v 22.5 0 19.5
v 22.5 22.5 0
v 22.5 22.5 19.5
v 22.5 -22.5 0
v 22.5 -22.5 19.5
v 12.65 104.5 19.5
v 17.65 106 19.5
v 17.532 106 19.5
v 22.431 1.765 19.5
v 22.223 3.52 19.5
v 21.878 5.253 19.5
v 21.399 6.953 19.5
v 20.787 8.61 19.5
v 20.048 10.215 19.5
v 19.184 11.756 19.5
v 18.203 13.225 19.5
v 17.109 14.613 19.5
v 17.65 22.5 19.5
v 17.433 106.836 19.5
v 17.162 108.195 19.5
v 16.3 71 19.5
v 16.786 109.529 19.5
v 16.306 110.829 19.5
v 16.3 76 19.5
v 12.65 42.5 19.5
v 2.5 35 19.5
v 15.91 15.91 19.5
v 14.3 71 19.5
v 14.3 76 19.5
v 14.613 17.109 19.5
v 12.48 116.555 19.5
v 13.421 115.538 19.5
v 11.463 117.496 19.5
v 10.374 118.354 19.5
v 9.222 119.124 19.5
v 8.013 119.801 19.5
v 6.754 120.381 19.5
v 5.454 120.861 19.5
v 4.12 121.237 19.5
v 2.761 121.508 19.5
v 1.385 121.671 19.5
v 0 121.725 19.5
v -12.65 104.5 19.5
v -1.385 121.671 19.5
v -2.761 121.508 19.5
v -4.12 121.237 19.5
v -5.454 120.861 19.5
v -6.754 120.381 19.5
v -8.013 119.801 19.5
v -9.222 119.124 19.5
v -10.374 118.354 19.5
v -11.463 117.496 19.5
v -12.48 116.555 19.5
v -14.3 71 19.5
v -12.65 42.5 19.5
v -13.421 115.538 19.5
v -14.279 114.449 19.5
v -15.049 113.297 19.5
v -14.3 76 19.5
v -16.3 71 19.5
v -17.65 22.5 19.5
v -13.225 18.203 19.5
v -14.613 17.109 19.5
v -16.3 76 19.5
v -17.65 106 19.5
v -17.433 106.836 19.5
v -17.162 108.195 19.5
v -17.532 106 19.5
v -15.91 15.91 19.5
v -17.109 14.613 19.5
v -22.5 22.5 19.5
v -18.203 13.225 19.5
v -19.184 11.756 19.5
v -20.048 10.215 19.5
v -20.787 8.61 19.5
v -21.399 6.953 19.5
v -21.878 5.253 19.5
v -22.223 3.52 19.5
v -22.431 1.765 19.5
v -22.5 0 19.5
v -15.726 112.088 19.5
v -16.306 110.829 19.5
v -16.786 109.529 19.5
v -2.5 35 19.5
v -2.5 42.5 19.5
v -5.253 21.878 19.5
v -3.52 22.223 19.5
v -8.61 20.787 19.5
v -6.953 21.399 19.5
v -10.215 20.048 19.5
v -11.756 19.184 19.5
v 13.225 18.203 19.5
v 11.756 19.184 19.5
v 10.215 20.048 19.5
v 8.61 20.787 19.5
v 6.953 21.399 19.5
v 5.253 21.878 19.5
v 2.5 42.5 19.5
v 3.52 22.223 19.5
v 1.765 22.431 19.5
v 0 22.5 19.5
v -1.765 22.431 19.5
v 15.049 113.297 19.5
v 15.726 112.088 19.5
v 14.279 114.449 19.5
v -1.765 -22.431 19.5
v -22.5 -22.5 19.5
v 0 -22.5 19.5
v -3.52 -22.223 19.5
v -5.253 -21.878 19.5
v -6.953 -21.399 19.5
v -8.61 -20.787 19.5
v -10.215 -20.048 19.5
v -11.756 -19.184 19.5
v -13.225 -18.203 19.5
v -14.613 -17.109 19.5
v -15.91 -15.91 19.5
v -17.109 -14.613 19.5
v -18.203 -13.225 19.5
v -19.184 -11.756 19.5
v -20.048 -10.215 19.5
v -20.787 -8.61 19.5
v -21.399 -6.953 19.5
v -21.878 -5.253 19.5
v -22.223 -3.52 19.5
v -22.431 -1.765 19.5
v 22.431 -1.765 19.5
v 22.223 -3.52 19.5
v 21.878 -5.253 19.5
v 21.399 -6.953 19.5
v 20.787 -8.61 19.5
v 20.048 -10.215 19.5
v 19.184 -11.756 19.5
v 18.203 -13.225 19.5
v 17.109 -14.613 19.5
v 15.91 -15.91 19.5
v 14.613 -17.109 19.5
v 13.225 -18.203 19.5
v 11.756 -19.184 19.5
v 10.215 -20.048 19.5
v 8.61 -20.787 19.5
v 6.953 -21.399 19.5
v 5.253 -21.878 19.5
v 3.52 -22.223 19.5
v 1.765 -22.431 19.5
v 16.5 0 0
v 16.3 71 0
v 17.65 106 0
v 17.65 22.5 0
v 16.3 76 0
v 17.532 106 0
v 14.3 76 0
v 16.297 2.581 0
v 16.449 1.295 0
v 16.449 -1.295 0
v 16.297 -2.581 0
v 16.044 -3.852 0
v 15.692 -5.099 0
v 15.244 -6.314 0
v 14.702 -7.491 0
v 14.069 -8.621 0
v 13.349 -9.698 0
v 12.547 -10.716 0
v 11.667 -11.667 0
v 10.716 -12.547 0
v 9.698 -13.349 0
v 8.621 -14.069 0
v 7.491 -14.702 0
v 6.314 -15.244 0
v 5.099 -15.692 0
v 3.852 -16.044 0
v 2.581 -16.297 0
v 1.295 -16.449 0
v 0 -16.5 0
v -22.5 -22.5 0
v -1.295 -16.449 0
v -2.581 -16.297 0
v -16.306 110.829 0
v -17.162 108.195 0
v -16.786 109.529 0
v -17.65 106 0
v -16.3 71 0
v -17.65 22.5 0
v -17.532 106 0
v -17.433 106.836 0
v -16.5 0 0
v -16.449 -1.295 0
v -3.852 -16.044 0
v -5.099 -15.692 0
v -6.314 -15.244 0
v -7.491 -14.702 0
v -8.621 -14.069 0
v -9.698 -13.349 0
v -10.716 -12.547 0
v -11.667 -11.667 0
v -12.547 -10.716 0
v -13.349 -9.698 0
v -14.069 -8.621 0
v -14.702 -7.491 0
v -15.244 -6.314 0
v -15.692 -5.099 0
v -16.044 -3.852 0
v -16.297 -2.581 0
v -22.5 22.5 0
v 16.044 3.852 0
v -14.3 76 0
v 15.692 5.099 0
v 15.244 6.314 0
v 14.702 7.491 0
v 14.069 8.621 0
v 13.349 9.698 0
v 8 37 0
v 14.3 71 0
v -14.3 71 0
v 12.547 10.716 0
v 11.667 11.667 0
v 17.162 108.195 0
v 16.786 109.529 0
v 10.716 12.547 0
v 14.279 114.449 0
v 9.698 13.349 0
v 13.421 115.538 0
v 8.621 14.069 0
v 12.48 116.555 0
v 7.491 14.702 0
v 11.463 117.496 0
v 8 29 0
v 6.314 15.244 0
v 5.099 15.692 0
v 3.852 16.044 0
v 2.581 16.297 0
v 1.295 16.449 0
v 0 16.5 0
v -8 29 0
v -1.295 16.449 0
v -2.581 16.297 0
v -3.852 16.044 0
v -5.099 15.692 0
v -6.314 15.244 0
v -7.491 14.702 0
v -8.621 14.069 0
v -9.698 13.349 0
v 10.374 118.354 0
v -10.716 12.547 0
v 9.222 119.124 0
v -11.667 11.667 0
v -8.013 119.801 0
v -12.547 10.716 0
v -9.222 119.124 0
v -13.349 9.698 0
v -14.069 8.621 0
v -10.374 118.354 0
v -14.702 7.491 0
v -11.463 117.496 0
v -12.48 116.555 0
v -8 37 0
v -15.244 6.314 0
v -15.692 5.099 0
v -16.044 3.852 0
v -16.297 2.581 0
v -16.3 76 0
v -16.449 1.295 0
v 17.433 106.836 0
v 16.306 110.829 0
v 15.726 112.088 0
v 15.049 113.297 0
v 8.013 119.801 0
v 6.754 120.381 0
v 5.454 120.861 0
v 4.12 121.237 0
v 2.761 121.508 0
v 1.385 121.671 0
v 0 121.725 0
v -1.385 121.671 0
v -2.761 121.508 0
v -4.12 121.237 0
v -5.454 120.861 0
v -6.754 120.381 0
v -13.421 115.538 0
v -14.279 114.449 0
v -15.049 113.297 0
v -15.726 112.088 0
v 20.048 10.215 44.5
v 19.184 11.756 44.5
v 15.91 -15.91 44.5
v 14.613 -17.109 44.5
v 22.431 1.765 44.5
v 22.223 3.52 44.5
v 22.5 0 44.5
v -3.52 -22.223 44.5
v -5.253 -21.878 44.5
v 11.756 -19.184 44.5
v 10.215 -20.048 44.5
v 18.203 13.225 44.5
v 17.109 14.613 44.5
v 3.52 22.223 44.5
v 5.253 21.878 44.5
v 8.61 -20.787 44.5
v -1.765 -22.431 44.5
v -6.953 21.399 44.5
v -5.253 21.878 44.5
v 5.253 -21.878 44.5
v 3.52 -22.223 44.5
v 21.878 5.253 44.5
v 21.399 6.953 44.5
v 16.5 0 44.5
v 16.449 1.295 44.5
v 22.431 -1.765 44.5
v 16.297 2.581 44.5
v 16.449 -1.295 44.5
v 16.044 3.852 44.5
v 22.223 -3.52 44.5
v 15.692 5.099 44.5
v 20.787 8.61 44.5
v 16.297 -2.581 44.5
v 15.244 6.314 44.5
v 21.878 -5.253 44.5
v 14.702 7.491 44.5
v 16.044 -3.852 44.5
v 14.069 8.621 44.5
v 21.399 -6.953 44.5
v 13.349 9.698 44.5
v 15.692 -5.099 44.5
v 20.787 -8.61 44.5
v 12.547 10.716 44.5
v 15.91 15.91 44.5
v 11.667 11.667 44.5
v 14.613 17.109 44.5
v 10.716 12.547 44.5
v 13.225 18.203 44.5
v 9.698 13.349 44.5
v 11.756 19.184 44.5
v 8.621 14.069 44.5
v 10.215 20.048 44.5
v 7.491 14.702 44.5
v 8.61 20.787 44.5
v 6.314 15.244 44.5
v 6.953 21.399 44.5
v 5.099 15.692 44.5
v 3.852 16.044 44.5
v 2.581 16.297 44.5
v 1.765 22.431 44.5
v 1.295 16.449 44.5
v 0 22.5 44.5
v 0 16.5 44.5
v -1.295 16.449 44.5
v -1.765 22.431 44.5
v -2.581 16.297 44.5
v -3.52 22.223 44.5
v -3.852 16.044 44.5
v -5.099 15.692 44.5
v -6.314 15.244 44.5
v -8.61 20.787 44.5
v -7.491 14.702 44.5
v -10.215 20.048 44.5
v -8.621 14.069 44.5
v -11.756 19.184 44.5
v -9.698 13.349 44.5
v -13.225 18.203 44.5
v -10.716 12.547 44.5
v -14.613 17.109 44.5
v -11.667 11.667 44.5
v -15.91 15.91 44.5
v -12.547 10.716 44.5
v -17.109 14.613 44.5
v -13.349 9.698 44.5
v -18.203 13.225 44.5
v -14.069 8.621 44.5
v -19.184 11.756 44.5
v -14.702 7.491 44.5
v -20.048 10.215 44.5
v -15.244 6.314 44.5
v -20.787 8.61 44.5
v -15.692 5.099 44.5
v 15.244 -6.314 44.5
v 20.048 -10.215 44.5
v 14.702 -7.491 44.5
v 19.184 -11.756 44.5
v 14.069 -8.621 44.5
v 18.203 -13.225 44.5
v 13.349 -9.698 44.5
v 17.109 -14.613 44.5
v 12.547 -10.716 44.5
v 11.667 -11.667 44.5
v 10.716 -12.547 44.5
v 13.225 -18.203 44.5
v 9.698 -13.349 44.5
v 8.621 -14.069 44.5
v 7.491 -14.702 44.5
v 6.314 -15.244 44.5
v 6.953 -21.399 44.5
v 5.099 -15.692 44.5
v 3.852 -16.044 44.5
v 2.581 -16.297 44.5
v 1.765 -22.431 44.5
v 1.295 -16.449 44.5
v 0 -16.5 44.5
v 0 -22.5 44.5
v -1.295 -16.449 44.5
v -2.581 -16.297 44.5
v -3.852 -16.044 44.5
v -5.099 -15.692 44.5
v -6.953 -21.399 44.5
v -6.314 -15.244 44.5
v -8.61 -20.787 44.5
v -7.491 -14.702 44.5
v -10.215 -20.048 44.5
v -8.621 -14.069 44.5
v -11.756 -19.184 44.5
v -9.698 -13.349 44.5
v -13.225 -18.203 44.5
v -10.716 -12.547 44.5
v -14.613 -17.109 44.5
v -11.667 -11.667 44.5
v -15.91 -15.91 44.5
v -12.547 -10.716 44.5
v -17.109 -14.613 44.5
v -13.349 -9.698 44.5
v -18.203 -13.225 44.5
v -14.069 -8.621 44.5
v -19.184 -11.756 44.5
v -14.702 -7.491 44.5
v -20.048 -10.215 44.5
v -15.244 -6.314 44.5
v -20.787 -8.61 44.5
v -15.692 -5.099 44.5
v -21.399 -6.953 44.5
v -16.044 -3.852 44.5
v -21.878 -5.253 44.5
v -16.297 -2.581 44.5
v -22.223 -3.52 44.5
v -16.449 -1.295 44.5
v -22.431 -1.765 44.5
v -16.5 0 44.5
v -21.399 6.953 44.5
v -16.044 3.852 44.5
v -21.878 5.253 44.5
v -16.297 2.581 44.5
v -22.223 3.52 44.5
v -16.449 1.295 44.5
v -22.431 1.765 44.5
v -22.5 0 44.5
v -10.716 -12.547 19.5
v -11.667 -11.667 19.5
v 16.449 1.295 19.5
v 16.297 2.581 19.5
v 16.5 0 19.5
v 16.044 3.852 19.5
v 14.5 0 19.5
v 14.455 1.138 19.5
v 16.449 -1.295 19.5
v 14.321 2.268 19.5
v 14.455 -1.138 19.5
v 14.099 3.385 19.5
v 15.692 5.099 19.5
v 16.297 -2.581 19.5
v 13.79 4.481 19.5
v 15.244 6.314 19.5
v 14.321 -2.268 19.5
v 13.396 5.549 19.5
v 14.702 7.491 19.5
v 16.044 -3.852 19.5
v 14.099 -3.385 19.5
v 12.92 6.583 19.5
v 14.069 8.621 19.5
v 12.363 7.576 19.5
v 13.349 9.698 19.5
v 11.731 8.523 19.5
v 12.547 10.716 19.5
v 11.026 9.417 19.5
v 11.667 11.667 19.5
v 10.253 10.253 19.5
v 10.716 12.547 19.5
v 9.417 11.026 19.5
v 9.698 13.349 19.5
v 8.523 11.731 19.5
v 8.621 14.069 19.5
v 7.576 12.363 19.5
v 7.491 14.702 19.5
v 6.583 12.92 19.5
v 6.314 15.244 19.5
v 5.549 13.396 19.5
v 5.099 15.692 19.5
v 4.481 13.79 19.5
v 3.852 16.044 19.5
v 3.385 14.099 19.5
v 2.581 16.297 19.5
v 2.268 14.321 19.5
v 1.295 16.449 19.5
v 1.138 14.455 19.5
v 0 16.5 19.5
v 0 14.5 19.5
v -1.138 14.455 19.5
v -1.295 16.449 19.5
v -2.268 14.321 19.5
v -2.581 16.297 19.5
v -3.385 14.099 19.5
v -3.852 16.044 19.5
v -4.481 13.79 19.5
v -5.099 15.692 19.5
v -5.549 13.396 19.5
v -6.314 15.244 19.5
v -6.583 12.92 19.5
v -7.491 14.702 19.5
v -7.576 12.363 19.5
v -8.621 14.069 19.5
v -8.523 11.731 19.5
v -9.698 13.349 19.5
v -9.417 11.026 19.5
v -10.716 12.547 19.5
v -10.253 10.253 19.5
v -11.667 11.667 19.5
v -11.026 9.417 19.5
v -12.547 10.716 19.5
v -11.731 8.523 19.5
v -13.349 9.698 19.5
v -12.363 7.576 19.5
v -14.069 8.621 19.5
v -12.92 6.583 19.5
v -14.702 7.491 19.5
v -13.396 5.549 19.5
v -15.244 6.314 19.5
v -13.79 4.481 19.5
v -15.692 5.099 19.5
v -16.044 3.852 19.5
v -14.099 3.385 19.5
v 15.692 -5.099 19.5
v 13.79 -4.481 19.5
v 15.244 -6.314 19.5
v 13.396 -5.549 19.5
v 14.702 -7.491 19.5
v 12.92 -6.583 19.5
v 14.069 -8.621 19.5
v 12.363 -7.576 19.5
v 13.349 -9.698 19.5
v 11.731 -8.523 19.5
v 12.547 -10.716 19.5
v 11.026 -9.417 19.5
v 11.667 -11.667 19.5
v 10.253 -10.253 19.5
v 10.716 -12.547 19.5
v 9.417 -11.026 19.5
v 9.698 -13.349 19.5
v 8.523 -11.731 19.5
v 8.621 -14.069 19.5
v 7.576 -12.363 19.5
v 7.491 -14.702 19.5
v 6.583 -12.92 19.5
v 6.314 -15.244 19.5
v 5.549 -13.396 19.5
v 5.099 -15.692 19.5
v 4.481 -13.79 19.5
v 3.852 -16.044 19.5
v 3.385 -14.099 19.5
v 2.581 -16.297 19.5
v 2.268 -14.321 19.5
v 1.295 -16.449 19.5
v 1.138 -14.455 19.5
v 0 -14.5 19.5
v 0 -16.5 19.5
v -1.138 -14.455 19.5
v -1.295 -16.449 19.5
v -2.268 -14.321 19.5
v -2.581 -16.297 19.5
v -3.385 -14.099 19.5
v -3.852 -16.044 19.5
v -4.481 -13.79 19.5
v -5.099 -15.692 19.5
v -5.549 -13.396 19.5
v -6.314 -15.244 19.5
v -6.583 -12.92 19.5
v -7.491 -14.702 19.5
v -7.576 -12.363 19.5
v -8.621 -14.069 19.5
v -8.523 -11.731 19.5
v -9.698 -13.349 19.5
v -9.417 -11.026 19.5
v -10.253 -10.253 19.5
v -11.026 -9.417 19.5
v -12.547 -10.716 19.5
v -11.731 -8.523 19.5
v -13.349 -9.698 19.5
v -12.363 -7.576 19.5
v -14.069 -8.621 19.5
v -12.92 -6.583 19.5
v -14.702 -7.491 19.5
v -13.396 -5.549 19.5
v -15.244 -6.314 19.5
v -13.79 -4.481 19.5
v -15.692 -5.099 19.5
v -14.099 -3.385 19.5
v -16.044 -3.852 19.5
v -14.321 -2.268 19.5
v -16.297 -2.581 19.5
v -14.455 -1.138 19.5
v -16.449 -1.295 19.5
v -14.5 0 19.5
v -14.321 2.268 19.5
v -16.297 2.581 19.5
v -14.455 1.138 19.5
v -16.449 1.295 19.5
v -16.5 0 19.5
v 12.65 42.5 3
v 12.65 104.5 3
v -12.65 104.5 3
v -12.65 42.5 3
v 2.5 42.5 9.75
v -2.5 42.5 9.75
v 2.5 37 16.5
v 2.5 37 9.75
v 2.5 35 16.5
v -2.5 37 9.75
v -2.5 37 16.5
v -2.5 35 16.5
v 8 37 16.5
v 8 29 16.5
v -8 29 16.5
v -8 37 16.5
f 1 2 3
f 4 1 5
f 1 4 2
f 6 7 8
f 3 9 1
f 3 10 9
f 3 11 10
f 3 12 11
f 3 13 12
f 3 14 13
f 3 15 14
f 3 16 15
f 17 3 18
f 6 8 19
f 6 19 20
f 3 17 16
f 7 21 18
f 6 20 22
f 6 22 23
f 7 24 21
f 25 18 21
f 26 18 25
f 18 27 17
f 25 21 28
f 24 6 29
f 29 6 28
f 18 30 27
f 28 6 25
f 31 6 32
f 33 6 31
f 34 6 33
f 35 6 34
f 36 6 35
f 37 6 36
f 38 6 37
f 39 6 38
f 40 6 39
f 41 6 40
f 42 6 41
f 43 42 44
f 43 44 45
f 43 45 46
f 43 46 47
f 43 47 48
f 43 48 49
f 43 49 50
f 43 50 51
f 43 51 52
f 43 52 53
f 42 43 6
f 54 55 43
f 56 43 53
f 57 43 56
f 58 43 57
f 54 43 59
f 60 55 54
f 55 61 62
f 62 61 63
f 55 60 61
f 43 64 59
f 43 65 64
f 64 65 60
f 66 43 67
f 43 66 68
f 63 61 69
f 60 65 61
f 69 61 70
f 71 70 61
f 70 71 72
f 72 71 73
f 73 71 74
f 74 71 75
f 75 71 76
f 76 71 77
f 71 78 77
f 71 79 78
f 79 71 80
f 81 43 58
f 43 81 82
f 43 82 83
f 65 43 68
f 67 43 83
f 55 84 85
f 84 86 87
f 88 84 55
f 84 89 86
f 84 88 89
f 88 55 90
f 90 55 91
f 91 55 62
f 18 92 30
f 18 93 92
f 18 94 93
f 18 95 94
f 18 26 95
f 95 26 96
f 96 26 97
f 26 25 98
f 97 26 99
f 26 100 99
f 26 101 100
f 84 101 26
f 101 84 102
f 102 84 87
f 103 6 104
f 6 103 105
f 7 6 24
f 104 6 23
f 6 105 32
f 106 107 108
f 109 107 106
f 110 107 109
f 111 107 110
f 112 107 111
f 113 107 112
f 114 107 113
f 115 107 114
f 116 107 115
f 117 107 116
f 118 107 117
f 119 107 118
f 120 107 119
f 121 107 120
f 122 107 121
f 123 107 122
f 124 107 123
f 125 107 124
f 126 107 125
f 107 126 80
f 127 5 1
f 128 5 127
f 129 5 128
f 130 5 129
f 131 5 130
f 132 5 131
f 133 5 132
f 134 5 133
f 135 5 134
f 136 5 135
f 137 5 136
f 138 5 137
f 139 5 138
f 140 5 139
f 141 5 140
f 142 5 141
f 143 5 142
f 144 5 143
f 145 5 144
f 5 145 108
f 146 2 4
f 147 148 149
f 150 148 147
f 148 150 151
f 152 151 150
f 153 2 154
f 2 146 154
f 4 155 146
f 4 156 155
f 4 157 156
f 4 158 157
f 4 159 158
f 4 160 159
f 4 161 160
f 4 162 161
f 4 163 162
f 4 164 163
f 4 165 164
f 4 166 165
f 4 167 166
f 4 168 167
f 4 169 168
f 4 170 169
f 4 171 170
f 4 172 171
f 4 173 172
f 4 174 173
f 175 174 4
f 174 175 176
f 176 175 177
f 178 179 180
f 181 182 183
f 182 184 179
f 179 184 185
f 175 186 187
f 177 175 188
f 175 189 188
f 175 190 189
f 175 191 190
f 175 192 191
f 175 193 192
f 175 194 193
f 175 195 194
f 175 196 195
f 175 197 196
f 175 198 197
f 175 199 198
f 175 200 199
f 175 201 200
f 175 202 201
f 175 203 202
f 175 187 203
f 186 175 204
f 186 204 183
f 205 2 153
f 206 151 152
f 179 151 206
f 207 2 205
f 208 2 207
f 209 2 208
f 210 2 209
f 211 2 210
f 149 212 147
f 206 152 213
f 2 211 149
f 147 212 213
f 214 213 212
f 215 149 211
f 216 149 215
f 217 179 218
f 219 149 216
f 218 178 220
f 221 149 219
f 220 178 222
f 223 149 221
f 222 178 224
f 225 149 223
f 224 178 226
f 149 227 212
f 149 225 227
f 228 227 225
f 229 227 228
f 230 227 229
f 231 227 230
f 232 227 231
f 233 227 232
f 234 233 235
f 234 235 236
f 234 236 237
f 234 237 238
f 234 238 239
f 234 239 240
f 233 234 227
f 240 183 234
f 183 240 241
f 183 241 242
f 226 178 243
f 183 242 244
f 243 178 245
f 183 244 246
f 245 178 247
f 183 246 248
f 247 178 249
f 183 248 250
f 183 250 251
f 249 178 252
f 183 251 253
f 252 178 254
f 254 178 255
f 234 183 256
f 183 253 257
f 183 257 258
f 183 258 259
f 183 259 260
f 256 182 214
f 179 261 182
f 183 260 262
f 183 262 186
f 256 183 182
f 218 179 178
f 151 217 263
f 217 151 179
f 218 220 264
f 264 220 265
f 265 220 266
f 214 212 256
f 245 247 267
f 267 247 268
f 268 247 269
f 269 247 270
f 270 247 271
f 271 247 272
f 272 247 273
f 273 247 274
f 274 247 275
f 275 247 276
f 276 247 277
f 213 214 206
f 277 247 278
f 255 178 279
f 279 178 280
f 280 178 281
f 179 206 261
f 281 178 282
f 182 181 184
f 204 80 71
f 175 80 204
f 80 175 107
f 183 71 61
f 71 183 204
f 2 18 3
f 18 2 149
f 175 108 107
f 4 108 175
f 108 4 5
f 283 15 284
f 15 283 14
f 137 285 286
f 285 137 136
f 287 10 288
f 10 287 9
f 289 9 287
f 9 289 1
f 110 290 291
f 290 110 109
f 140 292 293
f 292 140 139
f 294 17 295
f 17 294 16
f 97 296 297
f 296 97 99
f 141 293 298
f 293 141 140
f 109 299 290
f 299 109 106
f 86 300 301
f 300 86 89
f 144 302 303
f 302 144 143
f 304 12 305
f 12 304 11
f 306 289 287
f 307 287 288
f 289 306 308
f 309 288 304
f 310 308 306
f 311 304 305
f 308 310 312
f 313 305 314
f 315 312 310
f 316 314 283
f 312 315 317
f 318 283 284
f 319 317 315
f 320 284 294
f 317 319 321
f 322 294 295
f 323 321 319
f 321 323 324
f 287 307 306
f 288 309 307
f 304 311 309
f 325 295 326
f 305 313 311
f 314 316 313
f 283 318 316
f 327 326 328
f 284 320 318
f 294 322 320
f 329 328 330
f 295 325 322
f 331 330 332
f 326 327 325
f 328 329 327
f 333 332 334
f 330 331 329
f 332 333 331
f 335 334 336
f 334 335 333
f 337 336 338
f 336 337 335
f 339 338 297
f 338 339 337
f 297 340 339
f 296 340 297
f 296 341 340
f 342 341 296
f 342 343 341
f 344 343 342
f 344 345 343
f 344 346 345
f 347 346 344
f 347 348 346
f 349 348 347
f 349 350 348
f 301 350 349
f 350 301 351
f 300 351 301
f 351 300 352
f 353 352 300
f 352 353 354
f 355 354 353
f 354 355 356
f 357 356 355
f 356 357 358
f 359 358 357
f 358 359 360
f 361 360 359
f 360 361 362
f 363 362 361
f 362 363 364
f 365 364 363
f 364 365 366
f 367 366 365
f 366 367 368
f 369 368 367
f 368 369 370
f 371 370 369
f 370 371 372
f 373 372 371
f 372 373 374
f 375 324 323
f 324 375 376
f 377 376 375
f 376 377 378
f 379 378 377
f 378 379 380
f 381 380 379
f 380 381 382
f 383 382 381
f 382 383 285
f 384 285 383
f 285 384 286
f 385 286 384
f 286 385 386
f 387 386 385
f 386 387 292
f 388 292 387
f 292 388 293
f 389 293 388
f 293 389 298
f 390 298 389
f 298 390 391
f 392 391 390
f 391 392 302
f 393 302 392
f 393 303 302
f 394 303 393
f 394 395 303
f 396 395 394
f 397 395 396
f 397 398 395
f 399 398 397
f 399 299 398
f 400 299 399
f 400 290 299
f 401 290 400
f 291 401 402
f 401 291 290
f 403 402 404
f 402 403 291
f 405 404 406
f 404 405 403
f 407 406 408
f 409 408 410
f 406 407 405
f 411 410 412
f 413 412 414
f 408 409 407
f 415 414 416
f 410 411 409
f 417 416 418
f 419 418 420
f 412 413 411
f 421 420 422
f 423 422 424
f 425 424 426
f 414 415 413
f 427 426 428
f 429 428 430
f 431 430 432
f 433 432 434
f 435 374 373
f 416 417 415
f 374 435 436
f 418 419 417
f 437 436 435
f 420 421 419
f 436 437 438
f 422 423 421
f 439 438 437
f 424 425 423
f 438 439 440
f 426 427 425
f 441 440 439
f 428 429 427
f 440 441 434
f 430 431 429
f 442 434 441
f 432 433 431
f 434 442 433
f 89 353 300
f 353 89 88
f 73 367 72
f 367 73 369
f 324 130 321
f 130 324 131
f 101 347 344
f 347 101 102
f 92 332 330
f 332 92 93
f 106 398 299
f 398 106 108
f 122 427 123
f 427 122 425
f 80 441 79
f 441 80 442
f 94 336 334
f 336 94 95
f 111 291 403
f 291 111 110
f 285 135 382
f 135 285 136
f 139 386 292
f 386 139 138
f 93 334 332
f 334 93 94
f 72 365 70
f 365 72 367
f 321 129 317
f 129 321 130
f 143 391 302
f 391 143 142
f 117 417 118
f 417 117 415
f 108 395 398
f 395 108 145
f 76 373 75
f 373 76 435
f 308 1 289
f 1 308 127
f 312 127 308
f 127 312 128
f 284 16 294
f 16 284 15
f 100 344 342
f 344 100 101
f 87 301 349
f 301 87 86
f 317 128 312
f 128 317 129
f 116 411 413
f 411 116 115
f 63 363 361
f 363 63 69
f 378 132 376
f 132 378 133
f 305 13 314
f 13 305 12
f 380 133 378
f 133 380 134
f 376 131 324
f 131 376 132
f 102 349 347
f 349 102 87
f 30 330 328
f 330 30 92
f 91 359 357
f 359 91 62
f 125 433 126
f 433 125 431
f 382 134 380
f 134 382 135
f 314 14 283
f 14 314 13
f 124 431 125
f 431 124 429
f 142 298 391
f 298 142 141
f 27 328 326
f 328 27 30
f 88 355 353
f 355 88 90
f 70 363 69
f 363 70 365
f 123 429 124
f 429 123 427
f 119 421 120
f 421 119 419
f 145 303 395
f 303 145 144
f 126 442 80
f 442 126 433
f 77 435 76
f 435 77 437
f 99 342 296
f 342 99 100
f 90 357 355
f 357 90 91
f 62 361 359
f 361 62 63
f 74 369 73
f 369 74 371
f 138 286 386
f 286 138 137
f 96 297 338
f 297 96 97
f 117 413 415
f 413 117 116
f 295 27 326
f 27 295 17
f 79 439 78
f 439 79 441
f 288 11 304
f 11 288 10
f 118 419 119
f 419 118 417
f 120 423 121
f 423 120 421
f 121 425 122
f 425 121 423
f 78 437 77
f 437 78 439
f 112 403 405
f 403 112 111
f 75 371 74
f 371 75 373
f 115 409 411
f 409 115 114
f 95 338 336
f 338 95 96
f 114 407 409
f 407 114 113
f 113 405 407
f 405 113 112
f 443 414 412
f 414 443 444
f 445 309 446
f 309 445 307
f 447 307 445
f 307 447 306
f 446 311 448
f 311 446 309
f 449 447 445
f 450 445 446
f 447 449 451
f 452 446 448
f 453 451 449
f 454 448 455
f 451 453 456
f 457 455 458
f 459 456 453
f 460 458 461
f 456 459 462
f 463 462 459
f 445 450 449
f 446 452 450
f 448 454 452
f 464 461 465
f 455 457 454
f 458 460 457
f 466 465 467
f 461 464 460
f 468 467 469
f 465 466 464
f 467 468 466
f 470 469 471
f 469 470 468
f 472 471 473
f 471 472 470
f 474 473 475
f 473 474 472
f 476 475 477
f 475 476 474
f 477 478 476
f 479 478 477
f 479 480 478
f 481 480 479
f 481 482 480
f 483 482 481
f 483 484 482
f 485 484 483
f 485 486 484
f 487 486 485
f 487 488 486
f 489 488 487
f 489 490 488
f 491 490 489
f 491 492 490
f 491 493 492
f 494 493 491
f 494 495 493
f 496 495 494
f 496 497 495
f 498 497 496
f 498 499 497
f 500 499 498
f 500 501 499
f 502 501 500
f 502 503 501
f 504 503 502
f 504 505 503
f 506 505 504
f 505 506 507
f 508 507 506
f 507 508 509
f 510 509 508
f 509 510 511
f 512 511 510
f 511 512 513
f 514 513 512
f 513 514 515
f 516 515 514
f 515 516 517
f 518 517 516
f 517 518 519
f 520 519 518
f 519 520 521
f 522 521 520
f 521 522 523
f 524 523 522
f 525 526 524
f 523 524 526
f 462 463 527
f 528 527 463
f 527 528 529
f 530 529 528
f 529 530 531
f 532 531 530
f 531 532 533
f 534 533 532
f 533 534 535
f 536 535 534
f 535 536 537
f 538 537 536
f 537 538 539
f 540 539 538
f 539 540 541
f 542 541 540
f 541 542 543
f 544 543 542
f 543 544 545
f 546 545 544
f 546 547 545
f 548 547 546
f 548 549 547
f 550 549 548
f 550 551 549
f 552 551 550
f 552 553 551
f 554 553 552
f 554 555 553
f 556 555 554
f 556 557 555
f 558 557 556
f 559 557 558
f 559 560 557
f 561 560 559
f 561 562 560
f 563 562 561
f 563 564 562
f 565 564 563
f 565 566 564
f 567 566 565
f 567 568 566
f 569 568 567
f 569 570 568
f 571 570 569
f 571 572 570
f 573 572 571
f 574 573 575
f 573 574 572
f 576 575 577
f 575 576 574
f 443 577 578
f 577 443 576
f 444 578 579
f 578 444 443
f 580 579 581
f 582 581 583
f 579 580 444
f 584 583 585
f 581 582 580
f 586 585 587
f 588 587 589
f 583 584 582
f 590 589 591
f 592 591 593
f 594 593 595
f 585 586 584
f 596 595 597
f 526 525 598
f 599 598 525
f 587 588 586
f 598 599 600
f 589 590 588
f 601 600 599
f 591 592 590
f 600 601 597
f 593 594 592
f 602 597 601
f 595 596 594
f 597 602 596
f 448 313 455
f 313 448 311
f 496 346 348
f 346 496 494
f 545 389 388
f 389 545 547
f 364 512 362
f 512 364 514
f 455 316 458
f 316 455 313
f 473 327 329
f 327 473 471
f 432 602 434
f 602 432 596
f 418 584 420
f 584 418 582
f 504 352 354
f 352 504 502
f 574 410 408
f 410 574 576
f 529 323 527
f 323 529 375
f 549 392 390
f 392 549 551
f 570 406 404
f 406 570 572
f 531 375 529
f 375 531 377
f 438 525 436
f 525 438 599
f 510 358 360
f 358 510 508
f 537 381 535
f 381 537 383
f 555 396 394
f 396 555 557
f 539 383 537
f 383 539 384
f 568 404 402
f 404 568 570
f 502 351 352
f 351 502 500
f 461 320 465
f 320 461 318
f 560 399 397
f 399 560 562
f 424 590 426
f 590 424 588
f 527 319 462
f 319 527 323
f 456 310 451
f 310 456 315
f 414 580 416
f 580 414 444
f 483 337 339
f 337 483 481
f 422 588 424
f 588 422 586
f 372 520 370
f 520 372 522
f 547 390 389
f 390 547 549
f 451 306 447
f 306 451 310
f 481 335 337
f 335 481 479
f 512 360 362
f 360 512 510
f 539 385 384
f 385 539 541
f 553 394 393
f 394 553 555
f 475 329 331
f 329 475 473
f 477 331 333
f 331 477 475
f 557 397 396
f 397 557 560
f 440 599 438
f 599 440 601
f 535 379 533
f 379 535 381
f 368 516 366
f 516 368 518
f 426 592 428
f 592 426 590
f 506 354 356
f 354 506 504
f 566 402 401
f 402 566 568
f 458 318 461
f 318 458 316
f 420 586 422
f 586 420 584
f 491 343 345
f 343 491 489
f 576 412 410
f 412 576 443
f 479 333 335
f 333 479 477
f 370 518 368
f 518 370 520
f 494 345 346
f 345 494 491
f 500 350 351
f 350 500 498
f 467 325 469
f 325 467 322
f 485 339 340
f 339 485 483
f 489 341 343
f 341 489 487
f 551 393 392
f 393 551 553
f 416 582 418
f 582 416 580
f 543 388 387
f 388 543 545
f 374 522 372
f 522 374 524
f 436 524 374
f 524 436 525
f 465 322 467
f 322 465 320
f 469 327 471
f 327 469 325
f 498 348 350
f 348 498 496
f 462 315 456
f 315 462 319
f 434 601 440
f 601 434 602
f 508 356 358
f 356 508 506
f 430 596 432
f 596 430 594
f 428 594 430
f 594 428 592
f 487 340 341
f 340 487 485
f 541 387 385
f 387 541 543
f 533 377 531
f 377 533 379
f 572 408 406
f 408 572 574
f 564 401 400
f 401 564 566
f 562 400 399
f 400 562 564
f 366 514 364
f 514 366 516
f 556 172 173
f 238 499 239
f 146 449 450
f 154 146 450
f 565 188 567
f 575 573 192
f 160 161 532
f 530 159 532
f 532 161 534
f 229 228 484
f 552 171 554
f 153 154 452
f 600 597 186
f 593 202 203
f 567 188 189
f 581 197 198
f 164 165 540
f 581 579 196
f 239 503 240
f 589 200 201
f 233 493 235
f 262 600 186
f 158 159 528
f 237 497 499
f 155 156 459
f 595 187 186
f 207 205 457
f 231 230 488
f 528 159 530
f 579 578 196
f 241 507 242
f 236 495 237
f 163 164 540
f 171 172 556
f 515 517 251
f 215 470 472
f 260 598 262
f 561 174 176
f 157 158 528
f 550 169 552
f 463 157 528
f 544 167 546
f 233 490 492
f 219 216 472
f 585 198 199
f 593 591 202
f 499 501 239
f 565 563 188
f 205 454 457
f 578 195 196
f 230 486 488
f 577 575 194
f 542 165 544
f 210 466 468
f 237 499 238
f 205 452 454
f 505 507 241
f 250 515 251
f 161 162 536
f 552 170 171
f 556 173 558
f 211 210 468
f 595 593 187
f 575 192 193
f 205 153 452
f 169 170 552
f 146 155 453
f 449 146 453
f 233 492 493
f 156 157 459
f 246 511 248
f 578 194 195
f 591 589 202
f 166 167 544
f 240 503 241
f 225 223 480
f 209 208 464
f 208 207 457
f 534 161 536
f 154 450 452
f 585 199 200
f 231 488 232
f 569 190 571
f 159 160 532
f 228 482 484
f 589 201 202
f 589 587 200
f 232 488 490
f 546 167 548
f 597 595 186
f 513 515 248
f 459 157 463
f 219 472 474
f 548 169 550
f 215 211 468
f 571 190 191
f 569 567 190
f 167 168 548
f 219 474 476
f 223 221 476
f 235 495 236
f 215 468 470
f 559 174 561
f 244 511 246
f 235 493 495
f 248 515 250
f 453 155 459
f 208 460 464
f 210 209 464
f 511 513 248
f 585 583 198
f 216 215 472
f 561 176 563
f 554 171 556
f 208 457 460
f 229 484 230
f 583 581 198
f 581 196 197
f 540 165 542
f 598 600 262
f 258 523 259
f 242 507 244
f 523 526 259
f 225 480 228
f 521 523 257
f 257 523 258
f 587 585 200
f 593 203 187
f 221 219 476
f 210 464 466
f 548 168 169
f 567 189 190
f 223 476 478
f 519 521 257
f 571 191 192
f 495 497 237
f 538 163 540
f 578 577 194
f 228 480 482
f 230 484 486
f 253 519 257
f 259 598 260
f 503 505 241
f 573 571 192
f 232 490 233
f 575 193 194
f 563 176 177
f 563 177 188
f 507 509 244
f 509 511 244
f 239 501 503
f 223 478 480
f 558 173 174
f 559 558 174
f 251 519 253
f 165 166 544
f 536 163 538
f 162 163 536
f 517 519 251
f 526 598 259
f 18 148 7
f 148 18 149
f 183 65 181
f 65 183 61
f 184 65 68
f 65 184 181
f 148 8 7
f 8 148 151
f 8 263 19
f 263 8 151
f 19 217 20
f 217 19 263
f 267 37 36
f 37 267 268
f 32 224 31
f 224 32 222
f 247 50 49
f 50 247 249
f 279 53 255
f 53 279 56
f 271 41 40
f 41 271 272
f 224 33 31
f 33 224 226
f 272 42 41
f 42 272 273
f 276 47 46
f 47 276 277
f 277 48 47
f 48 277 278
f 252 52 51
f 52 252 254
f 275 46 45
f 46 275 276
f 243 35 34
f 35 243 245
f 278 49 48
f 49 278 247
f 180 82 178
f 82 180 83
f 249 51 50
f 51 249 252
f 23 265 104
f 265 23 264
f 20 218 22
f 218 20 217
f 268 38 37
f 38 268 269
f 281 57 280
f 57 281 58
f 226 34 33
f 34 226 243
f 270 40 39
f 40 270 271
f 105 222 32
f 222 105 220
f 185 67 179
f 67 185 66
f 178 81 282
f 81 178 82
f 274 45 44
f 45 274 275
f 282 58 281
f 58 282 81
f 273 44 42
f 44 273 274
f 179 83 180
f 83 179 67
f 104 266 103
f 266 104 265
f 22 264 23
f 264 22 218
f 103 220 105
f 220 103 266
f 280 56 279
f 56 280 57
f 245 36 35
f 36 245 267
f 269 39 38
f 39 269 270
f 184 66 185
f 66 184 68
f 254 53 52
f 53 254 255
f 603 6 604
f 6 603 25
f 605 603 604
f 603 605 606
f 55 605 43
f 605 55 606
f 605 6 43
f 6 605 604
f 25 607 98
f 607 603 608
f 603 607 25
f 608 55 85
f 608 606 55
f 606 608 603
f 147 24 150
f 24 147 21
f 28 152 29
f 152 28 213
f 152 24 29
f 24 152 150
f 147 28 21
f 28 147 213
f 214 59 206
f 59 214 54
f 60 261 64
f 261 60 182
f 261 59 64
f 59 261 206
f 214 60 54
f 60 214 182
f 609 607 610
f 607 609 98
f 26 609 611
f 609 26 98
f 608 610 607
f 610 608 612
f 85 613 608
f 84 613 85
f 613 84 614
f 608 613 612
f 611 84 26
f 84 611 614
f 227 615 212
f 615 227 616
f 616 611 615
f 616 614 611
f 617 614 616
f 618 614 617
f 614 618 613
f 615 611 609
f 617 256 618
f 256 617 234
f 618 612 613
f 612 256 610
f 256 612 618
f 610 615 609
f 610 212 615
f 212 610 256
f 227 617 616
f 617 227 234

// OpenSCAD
add_battery_holder=true;
pipe_diameter=33;
fan_size=40;
battery_depth=16.5;
battery_width=25.3;
battery_height=52;
block_height=battery_depth + 3;
//block_height=16.5;

module fan_blower(){
difference(){
union(){
//create fan block
translate([0,0,block_height/2]) cube([fan_size+5,fan_size+5,block_height], center=true);
//add top shroud
translate([0,0,block_height]) cylinder(r=(fan_size+5)/2,h=25,$fn=80);
}
//create tube mount
translate([0,0,block_height]) cylinder(r=pipe_diameter/2,25,$fn=80);
//create air path
cylinder(r1=pipe_diameter/2,r2=(pipe_diameter-4)/2,29/2,h=block_height,$fn=80);
}
}


//create battery holder
module battery_holder(){
difference(){
union(){
//create main battery block bigger than battery dimensions
translate([0,((fan_size/2)+(battery_height/2)+(pipe_diameter/2)),block_height/2]) cube([battery_width+10,battery_height+35,block_height],center=true);

//add rounded end to it
translate([0,(fan_size/2+battery_height+10)+((battery_width/2+2.5)/2)+(pipe_diameter/2)-2,block_height/2]) cylinder(r=battery_width/2+5,h=battery_depth+3,$fn=80,center=true);
}

//take away battery recess
translate([0,(fan_size+5/2)+battery_height/2+5,block_height/2+1.5]) cube([battery_width,battery_height+10,battery_depth], center=true);

//create some slots for cable_tie
translate([(battery_width-10),(fan_size+5/2)+(battery_height/2)+5,block_height]) cube([2,5,block_height*2],center=true);
translate([(battery_width-(battery_width*2)+10),(fan_size+5/2)+(battery_height/2)+5,block_height]) cube([2,5,block_height*2],center=true);

//create a cable channel
//battery_height+30
translate([0,fan_size/2+20,block_height/2+5]) cube([5,10,10], center=true);

//create pocket for switch
translate([0,fan_size/2+13,battery_depth/2]) cube([16,8,block_height-3], center=true);
//translate([0,fan_size/2+13,battery_depth/2]) cube([23.3,7.6,2], center=true);

}
}

if (add_battery_holder==true)
{
union(){
fan_blower();
battery_holder();
}
} else {
fan_blower();
}
